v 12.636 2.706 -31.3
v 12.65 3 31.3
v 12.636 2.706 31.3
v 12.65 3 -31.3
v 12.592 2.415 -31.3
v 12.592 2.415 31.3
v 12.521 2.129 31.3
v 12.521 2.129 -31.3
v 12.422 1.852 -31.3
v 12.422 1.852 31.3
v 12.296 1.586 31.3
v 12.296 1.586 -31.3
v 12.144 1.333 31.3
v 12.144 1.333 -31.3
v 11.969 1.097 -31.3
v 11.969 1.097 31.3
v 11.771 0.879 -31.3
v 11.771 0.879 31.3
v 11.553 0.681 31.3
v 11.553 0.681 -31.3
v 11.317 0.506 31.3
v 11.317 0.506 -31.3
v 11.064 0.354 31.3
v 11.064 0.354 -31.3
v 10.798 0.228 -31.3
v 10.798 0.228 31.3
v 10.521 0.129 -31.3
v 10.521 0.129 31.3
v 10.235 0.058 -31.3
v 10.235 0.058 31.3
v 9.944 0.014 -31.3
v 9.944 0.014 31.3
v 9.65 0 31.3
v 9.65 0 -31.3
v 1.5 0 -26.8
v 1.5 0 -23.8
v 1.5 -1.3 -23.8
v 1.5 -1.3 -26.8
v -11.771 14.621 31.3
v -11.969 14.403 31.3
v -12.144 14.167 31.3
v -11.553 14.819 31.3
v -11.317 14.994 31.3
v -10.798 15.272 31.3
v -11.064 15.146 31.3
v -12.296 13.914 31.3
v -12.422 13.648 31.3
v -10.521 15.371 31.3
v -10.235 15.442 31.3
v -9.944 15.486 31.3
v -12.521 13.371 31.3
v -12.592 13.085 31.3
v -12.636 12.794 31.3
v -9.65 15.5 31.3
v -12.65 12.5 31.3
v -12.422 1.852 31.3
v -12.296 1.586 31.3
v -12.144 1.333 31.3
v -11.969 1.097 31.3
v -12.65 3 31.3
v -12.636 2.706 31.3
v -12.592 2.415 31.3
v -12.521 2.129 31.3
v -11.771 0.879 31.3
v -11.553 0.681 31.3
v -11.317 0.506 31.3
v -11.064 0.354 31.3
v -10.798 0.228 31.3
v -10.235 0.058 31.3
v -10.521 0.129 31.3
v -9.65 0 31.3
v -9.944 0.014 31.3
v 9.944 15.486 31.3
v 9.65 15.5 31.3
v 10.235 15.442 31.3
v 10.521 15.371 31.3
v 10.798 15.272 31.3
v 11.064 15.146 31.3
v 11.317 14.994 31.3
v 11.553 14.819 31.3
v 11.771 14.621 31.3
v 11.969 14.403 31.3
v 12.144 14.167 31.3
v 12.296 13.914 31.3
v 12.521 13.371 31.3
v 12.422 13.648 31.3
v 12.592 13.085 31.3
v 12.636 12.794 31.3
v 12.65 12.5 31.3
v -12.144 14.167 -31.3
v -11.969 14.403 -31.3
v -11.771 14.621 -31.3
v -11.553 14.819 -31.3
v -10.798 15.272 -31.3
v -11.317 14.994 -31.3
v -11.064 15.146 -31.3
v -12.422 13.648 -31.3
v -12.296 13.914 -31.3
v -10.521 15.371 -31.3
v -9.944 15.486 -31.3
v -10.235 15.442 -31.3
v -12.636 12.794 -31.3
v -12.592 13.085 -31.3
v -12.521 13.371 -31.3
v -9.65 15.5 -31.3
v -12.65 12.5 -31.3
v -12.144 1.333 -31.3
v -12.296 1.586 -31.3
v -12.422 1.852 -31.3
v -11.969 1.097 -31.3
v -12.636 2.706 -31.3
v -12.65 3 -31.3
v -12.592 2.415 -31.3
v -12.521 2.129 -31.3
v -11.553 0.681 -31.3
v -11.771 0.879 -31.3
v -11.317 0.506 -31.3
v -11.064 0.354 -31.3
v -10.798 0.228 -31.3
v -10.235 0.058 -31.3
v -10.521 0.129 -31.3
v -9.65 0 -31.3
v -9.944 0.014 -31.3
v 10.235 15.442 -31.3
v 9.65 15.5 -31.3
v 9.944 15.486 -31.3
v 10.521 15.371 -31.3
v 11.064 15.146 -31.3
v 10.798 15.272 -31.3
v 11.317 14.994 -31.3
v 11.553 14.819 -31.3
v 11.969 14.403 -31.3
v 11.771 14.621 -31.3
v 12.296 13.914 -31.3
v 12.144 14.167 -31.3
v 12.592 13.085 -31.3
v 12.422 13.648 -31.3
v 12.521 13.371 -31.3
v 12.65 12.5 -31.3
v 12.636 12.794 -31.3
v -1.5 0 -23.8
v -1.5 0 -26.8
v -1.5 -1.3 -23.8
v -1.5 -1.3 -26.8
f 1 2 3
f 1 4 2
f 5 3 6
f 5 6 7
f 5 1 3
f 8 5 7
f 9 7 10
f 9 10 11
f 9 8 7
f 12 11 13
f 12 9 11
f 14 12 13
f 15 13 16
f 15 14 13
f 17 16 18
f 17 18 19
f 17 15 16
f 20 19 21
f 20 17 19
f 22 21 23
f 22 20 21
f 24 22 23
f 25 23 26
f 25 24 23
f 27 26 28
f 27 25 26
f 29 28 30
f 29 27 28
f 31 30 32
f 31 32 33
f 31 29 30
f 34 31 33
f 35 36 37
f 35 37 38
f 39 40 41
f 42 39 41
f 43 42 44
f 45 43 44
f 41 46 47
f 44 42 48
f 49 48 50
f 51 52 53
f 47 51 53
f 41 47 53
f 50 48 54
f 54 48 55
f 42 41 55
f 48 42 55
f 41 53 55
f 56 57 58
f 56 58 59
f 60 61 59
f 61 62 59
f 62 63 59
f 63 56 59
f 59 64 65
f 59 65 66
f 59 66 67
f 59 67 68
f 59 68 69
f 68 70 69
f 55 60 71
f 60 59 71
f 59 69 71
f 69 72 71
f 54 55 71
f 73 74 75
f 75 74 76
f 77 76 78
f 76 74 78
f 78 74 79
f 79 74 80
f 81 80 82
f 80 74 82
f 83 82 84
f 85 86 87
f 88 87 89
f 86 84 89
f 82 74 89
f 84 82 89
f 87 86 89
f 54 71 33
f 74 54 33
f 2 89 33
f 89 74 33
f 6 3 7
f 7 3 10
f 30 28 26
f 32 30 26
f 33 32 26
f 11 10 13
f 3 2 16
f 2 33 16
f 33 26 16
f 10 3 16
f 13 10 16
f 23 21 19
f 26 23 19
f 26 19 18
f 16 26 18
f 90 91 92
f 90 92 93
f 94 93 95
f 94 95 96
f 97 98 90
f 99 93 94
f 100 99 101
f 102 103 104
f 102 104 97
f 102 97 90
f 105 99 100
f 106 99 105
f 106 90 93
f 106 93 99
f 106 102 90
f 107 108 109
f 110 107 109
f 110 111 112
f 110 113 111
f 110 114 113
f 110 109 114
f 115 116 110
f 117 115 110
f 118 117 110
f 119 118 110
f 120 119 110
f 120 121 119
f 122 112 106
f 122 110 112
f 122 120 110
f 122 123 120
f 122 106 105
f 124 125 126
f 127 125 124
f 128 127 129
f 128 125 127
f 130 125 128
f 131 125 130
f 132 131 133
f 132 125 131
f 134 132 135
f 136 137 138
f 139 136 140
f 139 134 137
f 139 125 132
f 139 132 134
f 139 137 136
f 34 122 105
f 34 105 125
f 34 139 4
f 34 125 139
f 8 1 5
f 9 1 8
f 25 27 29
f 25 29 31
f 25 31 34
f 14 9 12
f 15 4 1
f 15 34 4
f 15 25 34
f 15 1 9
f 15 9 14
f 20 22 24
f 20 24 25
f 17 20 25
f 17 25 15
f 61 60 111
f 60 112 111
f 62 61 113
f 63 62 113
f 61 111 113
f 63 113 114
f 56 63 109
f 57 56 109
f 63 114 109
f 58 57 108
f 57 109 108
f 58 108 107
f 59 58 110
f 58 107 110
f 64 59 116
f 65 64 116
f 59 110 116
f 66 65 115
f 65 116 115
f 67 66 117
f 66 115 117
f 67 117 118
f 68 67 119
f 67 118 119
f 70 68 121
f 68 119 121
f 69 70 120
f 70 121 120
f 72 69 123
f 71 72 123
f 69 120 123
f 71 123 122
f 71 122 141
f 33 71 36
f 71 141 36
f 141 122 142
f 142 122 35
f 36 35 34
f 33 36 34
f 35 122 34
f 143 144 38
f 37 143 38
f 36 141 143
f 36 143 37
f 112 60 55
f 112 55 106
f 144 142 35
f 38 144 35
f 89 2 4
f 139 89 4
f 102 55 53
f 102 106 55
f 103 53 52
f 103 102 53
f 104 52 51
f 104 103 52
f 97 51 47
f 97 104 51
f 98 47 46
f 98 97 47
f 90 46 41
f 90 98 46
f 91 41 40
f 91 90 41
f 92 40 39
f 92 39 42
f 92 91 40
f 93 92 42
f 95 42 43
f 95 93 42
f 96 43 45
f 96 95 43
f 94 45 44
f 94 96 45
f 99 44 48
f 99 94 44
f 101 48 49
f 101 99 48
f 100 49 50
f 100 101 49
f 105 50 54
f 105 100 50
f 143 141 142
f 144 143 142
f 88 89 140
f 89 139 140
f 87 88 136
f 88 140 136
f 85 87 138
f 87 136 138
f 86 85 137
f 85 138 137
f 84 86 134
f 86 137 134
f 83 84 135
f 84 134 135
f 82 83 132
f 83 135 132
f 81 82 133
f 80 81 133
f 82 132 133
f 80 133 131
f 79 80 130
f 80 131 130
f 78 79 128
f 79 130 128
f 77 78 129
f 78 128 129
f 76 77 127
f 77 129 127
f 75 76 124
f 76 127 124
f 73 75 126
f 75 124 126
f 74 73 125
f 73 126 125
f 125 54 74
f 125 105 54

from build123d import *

# Parameters (mm, degrees)
HOLDER_OUTLINE_W                    = 25.3
HOLDER_OUTLINE_H                    = 62.6
F_2XAAA_HOLDER_25_3X62_6X15_5_DEPTH = 15.5
LONG_EDGE_FILLETS_R3_R              = 3
SLIDE_SWITCH_LEVER_SKETCH_W         = 3
SLIDE_SWITCH_LEVER_SKETCH_H         = 3
SLIDE_SWITCH_LEVER_3X3X1_3_DEPTH    = 1.3


with BuildPart() as part:
    # Holder Outline → 2xAAA Holder 25.3x62.6x15.5 (new body)
    with BuildSketch(Plane(origin=(0, 0, 0), x_dir=(1, 0, 0), z_dir=(0, 1, 0))):
        Rectangle(HOLDER_OUTLINE_W, HOLDER_OUTLINE_H)
    extrude(amount=F_2XAAA_HOLDER_25_3X62_6X15_5_DEPTH)

    # Long Edge Fillets R3
    long_edge_fillets_r3_edges = [part.edges().sort_by_distance(p)[0] for p in [
        (12.65, 15.5, 0),
        (-12.65, 15.5, 0),
        (12.65, 0, 0),
        (-12.65, 0, 0),
    ]]
    fillet(long_edge_fillets_r3_edges, radius=LONG_EDGE_FILLETS_R3_R)

    # Slide Switch Lever Sketch → Slide Switch Lever 3x3x1.3 (add)
    with BuildSketch(Plane(origin=(0, 0, 0), x_dir=(1, 0, 0), z_dir=(0, 1, 0))):
        with Locations((0, 25.3)):
            Rectangle(SLIDE_SWITCH_LEVER_SKETCH_W, SLIDE_SWITCH_LEVER_SKETCH_H)
    extrude(amount=-SLIDE_SWITCH_LEVER_3X3X1_3_DEPTH)


solid = part.part
